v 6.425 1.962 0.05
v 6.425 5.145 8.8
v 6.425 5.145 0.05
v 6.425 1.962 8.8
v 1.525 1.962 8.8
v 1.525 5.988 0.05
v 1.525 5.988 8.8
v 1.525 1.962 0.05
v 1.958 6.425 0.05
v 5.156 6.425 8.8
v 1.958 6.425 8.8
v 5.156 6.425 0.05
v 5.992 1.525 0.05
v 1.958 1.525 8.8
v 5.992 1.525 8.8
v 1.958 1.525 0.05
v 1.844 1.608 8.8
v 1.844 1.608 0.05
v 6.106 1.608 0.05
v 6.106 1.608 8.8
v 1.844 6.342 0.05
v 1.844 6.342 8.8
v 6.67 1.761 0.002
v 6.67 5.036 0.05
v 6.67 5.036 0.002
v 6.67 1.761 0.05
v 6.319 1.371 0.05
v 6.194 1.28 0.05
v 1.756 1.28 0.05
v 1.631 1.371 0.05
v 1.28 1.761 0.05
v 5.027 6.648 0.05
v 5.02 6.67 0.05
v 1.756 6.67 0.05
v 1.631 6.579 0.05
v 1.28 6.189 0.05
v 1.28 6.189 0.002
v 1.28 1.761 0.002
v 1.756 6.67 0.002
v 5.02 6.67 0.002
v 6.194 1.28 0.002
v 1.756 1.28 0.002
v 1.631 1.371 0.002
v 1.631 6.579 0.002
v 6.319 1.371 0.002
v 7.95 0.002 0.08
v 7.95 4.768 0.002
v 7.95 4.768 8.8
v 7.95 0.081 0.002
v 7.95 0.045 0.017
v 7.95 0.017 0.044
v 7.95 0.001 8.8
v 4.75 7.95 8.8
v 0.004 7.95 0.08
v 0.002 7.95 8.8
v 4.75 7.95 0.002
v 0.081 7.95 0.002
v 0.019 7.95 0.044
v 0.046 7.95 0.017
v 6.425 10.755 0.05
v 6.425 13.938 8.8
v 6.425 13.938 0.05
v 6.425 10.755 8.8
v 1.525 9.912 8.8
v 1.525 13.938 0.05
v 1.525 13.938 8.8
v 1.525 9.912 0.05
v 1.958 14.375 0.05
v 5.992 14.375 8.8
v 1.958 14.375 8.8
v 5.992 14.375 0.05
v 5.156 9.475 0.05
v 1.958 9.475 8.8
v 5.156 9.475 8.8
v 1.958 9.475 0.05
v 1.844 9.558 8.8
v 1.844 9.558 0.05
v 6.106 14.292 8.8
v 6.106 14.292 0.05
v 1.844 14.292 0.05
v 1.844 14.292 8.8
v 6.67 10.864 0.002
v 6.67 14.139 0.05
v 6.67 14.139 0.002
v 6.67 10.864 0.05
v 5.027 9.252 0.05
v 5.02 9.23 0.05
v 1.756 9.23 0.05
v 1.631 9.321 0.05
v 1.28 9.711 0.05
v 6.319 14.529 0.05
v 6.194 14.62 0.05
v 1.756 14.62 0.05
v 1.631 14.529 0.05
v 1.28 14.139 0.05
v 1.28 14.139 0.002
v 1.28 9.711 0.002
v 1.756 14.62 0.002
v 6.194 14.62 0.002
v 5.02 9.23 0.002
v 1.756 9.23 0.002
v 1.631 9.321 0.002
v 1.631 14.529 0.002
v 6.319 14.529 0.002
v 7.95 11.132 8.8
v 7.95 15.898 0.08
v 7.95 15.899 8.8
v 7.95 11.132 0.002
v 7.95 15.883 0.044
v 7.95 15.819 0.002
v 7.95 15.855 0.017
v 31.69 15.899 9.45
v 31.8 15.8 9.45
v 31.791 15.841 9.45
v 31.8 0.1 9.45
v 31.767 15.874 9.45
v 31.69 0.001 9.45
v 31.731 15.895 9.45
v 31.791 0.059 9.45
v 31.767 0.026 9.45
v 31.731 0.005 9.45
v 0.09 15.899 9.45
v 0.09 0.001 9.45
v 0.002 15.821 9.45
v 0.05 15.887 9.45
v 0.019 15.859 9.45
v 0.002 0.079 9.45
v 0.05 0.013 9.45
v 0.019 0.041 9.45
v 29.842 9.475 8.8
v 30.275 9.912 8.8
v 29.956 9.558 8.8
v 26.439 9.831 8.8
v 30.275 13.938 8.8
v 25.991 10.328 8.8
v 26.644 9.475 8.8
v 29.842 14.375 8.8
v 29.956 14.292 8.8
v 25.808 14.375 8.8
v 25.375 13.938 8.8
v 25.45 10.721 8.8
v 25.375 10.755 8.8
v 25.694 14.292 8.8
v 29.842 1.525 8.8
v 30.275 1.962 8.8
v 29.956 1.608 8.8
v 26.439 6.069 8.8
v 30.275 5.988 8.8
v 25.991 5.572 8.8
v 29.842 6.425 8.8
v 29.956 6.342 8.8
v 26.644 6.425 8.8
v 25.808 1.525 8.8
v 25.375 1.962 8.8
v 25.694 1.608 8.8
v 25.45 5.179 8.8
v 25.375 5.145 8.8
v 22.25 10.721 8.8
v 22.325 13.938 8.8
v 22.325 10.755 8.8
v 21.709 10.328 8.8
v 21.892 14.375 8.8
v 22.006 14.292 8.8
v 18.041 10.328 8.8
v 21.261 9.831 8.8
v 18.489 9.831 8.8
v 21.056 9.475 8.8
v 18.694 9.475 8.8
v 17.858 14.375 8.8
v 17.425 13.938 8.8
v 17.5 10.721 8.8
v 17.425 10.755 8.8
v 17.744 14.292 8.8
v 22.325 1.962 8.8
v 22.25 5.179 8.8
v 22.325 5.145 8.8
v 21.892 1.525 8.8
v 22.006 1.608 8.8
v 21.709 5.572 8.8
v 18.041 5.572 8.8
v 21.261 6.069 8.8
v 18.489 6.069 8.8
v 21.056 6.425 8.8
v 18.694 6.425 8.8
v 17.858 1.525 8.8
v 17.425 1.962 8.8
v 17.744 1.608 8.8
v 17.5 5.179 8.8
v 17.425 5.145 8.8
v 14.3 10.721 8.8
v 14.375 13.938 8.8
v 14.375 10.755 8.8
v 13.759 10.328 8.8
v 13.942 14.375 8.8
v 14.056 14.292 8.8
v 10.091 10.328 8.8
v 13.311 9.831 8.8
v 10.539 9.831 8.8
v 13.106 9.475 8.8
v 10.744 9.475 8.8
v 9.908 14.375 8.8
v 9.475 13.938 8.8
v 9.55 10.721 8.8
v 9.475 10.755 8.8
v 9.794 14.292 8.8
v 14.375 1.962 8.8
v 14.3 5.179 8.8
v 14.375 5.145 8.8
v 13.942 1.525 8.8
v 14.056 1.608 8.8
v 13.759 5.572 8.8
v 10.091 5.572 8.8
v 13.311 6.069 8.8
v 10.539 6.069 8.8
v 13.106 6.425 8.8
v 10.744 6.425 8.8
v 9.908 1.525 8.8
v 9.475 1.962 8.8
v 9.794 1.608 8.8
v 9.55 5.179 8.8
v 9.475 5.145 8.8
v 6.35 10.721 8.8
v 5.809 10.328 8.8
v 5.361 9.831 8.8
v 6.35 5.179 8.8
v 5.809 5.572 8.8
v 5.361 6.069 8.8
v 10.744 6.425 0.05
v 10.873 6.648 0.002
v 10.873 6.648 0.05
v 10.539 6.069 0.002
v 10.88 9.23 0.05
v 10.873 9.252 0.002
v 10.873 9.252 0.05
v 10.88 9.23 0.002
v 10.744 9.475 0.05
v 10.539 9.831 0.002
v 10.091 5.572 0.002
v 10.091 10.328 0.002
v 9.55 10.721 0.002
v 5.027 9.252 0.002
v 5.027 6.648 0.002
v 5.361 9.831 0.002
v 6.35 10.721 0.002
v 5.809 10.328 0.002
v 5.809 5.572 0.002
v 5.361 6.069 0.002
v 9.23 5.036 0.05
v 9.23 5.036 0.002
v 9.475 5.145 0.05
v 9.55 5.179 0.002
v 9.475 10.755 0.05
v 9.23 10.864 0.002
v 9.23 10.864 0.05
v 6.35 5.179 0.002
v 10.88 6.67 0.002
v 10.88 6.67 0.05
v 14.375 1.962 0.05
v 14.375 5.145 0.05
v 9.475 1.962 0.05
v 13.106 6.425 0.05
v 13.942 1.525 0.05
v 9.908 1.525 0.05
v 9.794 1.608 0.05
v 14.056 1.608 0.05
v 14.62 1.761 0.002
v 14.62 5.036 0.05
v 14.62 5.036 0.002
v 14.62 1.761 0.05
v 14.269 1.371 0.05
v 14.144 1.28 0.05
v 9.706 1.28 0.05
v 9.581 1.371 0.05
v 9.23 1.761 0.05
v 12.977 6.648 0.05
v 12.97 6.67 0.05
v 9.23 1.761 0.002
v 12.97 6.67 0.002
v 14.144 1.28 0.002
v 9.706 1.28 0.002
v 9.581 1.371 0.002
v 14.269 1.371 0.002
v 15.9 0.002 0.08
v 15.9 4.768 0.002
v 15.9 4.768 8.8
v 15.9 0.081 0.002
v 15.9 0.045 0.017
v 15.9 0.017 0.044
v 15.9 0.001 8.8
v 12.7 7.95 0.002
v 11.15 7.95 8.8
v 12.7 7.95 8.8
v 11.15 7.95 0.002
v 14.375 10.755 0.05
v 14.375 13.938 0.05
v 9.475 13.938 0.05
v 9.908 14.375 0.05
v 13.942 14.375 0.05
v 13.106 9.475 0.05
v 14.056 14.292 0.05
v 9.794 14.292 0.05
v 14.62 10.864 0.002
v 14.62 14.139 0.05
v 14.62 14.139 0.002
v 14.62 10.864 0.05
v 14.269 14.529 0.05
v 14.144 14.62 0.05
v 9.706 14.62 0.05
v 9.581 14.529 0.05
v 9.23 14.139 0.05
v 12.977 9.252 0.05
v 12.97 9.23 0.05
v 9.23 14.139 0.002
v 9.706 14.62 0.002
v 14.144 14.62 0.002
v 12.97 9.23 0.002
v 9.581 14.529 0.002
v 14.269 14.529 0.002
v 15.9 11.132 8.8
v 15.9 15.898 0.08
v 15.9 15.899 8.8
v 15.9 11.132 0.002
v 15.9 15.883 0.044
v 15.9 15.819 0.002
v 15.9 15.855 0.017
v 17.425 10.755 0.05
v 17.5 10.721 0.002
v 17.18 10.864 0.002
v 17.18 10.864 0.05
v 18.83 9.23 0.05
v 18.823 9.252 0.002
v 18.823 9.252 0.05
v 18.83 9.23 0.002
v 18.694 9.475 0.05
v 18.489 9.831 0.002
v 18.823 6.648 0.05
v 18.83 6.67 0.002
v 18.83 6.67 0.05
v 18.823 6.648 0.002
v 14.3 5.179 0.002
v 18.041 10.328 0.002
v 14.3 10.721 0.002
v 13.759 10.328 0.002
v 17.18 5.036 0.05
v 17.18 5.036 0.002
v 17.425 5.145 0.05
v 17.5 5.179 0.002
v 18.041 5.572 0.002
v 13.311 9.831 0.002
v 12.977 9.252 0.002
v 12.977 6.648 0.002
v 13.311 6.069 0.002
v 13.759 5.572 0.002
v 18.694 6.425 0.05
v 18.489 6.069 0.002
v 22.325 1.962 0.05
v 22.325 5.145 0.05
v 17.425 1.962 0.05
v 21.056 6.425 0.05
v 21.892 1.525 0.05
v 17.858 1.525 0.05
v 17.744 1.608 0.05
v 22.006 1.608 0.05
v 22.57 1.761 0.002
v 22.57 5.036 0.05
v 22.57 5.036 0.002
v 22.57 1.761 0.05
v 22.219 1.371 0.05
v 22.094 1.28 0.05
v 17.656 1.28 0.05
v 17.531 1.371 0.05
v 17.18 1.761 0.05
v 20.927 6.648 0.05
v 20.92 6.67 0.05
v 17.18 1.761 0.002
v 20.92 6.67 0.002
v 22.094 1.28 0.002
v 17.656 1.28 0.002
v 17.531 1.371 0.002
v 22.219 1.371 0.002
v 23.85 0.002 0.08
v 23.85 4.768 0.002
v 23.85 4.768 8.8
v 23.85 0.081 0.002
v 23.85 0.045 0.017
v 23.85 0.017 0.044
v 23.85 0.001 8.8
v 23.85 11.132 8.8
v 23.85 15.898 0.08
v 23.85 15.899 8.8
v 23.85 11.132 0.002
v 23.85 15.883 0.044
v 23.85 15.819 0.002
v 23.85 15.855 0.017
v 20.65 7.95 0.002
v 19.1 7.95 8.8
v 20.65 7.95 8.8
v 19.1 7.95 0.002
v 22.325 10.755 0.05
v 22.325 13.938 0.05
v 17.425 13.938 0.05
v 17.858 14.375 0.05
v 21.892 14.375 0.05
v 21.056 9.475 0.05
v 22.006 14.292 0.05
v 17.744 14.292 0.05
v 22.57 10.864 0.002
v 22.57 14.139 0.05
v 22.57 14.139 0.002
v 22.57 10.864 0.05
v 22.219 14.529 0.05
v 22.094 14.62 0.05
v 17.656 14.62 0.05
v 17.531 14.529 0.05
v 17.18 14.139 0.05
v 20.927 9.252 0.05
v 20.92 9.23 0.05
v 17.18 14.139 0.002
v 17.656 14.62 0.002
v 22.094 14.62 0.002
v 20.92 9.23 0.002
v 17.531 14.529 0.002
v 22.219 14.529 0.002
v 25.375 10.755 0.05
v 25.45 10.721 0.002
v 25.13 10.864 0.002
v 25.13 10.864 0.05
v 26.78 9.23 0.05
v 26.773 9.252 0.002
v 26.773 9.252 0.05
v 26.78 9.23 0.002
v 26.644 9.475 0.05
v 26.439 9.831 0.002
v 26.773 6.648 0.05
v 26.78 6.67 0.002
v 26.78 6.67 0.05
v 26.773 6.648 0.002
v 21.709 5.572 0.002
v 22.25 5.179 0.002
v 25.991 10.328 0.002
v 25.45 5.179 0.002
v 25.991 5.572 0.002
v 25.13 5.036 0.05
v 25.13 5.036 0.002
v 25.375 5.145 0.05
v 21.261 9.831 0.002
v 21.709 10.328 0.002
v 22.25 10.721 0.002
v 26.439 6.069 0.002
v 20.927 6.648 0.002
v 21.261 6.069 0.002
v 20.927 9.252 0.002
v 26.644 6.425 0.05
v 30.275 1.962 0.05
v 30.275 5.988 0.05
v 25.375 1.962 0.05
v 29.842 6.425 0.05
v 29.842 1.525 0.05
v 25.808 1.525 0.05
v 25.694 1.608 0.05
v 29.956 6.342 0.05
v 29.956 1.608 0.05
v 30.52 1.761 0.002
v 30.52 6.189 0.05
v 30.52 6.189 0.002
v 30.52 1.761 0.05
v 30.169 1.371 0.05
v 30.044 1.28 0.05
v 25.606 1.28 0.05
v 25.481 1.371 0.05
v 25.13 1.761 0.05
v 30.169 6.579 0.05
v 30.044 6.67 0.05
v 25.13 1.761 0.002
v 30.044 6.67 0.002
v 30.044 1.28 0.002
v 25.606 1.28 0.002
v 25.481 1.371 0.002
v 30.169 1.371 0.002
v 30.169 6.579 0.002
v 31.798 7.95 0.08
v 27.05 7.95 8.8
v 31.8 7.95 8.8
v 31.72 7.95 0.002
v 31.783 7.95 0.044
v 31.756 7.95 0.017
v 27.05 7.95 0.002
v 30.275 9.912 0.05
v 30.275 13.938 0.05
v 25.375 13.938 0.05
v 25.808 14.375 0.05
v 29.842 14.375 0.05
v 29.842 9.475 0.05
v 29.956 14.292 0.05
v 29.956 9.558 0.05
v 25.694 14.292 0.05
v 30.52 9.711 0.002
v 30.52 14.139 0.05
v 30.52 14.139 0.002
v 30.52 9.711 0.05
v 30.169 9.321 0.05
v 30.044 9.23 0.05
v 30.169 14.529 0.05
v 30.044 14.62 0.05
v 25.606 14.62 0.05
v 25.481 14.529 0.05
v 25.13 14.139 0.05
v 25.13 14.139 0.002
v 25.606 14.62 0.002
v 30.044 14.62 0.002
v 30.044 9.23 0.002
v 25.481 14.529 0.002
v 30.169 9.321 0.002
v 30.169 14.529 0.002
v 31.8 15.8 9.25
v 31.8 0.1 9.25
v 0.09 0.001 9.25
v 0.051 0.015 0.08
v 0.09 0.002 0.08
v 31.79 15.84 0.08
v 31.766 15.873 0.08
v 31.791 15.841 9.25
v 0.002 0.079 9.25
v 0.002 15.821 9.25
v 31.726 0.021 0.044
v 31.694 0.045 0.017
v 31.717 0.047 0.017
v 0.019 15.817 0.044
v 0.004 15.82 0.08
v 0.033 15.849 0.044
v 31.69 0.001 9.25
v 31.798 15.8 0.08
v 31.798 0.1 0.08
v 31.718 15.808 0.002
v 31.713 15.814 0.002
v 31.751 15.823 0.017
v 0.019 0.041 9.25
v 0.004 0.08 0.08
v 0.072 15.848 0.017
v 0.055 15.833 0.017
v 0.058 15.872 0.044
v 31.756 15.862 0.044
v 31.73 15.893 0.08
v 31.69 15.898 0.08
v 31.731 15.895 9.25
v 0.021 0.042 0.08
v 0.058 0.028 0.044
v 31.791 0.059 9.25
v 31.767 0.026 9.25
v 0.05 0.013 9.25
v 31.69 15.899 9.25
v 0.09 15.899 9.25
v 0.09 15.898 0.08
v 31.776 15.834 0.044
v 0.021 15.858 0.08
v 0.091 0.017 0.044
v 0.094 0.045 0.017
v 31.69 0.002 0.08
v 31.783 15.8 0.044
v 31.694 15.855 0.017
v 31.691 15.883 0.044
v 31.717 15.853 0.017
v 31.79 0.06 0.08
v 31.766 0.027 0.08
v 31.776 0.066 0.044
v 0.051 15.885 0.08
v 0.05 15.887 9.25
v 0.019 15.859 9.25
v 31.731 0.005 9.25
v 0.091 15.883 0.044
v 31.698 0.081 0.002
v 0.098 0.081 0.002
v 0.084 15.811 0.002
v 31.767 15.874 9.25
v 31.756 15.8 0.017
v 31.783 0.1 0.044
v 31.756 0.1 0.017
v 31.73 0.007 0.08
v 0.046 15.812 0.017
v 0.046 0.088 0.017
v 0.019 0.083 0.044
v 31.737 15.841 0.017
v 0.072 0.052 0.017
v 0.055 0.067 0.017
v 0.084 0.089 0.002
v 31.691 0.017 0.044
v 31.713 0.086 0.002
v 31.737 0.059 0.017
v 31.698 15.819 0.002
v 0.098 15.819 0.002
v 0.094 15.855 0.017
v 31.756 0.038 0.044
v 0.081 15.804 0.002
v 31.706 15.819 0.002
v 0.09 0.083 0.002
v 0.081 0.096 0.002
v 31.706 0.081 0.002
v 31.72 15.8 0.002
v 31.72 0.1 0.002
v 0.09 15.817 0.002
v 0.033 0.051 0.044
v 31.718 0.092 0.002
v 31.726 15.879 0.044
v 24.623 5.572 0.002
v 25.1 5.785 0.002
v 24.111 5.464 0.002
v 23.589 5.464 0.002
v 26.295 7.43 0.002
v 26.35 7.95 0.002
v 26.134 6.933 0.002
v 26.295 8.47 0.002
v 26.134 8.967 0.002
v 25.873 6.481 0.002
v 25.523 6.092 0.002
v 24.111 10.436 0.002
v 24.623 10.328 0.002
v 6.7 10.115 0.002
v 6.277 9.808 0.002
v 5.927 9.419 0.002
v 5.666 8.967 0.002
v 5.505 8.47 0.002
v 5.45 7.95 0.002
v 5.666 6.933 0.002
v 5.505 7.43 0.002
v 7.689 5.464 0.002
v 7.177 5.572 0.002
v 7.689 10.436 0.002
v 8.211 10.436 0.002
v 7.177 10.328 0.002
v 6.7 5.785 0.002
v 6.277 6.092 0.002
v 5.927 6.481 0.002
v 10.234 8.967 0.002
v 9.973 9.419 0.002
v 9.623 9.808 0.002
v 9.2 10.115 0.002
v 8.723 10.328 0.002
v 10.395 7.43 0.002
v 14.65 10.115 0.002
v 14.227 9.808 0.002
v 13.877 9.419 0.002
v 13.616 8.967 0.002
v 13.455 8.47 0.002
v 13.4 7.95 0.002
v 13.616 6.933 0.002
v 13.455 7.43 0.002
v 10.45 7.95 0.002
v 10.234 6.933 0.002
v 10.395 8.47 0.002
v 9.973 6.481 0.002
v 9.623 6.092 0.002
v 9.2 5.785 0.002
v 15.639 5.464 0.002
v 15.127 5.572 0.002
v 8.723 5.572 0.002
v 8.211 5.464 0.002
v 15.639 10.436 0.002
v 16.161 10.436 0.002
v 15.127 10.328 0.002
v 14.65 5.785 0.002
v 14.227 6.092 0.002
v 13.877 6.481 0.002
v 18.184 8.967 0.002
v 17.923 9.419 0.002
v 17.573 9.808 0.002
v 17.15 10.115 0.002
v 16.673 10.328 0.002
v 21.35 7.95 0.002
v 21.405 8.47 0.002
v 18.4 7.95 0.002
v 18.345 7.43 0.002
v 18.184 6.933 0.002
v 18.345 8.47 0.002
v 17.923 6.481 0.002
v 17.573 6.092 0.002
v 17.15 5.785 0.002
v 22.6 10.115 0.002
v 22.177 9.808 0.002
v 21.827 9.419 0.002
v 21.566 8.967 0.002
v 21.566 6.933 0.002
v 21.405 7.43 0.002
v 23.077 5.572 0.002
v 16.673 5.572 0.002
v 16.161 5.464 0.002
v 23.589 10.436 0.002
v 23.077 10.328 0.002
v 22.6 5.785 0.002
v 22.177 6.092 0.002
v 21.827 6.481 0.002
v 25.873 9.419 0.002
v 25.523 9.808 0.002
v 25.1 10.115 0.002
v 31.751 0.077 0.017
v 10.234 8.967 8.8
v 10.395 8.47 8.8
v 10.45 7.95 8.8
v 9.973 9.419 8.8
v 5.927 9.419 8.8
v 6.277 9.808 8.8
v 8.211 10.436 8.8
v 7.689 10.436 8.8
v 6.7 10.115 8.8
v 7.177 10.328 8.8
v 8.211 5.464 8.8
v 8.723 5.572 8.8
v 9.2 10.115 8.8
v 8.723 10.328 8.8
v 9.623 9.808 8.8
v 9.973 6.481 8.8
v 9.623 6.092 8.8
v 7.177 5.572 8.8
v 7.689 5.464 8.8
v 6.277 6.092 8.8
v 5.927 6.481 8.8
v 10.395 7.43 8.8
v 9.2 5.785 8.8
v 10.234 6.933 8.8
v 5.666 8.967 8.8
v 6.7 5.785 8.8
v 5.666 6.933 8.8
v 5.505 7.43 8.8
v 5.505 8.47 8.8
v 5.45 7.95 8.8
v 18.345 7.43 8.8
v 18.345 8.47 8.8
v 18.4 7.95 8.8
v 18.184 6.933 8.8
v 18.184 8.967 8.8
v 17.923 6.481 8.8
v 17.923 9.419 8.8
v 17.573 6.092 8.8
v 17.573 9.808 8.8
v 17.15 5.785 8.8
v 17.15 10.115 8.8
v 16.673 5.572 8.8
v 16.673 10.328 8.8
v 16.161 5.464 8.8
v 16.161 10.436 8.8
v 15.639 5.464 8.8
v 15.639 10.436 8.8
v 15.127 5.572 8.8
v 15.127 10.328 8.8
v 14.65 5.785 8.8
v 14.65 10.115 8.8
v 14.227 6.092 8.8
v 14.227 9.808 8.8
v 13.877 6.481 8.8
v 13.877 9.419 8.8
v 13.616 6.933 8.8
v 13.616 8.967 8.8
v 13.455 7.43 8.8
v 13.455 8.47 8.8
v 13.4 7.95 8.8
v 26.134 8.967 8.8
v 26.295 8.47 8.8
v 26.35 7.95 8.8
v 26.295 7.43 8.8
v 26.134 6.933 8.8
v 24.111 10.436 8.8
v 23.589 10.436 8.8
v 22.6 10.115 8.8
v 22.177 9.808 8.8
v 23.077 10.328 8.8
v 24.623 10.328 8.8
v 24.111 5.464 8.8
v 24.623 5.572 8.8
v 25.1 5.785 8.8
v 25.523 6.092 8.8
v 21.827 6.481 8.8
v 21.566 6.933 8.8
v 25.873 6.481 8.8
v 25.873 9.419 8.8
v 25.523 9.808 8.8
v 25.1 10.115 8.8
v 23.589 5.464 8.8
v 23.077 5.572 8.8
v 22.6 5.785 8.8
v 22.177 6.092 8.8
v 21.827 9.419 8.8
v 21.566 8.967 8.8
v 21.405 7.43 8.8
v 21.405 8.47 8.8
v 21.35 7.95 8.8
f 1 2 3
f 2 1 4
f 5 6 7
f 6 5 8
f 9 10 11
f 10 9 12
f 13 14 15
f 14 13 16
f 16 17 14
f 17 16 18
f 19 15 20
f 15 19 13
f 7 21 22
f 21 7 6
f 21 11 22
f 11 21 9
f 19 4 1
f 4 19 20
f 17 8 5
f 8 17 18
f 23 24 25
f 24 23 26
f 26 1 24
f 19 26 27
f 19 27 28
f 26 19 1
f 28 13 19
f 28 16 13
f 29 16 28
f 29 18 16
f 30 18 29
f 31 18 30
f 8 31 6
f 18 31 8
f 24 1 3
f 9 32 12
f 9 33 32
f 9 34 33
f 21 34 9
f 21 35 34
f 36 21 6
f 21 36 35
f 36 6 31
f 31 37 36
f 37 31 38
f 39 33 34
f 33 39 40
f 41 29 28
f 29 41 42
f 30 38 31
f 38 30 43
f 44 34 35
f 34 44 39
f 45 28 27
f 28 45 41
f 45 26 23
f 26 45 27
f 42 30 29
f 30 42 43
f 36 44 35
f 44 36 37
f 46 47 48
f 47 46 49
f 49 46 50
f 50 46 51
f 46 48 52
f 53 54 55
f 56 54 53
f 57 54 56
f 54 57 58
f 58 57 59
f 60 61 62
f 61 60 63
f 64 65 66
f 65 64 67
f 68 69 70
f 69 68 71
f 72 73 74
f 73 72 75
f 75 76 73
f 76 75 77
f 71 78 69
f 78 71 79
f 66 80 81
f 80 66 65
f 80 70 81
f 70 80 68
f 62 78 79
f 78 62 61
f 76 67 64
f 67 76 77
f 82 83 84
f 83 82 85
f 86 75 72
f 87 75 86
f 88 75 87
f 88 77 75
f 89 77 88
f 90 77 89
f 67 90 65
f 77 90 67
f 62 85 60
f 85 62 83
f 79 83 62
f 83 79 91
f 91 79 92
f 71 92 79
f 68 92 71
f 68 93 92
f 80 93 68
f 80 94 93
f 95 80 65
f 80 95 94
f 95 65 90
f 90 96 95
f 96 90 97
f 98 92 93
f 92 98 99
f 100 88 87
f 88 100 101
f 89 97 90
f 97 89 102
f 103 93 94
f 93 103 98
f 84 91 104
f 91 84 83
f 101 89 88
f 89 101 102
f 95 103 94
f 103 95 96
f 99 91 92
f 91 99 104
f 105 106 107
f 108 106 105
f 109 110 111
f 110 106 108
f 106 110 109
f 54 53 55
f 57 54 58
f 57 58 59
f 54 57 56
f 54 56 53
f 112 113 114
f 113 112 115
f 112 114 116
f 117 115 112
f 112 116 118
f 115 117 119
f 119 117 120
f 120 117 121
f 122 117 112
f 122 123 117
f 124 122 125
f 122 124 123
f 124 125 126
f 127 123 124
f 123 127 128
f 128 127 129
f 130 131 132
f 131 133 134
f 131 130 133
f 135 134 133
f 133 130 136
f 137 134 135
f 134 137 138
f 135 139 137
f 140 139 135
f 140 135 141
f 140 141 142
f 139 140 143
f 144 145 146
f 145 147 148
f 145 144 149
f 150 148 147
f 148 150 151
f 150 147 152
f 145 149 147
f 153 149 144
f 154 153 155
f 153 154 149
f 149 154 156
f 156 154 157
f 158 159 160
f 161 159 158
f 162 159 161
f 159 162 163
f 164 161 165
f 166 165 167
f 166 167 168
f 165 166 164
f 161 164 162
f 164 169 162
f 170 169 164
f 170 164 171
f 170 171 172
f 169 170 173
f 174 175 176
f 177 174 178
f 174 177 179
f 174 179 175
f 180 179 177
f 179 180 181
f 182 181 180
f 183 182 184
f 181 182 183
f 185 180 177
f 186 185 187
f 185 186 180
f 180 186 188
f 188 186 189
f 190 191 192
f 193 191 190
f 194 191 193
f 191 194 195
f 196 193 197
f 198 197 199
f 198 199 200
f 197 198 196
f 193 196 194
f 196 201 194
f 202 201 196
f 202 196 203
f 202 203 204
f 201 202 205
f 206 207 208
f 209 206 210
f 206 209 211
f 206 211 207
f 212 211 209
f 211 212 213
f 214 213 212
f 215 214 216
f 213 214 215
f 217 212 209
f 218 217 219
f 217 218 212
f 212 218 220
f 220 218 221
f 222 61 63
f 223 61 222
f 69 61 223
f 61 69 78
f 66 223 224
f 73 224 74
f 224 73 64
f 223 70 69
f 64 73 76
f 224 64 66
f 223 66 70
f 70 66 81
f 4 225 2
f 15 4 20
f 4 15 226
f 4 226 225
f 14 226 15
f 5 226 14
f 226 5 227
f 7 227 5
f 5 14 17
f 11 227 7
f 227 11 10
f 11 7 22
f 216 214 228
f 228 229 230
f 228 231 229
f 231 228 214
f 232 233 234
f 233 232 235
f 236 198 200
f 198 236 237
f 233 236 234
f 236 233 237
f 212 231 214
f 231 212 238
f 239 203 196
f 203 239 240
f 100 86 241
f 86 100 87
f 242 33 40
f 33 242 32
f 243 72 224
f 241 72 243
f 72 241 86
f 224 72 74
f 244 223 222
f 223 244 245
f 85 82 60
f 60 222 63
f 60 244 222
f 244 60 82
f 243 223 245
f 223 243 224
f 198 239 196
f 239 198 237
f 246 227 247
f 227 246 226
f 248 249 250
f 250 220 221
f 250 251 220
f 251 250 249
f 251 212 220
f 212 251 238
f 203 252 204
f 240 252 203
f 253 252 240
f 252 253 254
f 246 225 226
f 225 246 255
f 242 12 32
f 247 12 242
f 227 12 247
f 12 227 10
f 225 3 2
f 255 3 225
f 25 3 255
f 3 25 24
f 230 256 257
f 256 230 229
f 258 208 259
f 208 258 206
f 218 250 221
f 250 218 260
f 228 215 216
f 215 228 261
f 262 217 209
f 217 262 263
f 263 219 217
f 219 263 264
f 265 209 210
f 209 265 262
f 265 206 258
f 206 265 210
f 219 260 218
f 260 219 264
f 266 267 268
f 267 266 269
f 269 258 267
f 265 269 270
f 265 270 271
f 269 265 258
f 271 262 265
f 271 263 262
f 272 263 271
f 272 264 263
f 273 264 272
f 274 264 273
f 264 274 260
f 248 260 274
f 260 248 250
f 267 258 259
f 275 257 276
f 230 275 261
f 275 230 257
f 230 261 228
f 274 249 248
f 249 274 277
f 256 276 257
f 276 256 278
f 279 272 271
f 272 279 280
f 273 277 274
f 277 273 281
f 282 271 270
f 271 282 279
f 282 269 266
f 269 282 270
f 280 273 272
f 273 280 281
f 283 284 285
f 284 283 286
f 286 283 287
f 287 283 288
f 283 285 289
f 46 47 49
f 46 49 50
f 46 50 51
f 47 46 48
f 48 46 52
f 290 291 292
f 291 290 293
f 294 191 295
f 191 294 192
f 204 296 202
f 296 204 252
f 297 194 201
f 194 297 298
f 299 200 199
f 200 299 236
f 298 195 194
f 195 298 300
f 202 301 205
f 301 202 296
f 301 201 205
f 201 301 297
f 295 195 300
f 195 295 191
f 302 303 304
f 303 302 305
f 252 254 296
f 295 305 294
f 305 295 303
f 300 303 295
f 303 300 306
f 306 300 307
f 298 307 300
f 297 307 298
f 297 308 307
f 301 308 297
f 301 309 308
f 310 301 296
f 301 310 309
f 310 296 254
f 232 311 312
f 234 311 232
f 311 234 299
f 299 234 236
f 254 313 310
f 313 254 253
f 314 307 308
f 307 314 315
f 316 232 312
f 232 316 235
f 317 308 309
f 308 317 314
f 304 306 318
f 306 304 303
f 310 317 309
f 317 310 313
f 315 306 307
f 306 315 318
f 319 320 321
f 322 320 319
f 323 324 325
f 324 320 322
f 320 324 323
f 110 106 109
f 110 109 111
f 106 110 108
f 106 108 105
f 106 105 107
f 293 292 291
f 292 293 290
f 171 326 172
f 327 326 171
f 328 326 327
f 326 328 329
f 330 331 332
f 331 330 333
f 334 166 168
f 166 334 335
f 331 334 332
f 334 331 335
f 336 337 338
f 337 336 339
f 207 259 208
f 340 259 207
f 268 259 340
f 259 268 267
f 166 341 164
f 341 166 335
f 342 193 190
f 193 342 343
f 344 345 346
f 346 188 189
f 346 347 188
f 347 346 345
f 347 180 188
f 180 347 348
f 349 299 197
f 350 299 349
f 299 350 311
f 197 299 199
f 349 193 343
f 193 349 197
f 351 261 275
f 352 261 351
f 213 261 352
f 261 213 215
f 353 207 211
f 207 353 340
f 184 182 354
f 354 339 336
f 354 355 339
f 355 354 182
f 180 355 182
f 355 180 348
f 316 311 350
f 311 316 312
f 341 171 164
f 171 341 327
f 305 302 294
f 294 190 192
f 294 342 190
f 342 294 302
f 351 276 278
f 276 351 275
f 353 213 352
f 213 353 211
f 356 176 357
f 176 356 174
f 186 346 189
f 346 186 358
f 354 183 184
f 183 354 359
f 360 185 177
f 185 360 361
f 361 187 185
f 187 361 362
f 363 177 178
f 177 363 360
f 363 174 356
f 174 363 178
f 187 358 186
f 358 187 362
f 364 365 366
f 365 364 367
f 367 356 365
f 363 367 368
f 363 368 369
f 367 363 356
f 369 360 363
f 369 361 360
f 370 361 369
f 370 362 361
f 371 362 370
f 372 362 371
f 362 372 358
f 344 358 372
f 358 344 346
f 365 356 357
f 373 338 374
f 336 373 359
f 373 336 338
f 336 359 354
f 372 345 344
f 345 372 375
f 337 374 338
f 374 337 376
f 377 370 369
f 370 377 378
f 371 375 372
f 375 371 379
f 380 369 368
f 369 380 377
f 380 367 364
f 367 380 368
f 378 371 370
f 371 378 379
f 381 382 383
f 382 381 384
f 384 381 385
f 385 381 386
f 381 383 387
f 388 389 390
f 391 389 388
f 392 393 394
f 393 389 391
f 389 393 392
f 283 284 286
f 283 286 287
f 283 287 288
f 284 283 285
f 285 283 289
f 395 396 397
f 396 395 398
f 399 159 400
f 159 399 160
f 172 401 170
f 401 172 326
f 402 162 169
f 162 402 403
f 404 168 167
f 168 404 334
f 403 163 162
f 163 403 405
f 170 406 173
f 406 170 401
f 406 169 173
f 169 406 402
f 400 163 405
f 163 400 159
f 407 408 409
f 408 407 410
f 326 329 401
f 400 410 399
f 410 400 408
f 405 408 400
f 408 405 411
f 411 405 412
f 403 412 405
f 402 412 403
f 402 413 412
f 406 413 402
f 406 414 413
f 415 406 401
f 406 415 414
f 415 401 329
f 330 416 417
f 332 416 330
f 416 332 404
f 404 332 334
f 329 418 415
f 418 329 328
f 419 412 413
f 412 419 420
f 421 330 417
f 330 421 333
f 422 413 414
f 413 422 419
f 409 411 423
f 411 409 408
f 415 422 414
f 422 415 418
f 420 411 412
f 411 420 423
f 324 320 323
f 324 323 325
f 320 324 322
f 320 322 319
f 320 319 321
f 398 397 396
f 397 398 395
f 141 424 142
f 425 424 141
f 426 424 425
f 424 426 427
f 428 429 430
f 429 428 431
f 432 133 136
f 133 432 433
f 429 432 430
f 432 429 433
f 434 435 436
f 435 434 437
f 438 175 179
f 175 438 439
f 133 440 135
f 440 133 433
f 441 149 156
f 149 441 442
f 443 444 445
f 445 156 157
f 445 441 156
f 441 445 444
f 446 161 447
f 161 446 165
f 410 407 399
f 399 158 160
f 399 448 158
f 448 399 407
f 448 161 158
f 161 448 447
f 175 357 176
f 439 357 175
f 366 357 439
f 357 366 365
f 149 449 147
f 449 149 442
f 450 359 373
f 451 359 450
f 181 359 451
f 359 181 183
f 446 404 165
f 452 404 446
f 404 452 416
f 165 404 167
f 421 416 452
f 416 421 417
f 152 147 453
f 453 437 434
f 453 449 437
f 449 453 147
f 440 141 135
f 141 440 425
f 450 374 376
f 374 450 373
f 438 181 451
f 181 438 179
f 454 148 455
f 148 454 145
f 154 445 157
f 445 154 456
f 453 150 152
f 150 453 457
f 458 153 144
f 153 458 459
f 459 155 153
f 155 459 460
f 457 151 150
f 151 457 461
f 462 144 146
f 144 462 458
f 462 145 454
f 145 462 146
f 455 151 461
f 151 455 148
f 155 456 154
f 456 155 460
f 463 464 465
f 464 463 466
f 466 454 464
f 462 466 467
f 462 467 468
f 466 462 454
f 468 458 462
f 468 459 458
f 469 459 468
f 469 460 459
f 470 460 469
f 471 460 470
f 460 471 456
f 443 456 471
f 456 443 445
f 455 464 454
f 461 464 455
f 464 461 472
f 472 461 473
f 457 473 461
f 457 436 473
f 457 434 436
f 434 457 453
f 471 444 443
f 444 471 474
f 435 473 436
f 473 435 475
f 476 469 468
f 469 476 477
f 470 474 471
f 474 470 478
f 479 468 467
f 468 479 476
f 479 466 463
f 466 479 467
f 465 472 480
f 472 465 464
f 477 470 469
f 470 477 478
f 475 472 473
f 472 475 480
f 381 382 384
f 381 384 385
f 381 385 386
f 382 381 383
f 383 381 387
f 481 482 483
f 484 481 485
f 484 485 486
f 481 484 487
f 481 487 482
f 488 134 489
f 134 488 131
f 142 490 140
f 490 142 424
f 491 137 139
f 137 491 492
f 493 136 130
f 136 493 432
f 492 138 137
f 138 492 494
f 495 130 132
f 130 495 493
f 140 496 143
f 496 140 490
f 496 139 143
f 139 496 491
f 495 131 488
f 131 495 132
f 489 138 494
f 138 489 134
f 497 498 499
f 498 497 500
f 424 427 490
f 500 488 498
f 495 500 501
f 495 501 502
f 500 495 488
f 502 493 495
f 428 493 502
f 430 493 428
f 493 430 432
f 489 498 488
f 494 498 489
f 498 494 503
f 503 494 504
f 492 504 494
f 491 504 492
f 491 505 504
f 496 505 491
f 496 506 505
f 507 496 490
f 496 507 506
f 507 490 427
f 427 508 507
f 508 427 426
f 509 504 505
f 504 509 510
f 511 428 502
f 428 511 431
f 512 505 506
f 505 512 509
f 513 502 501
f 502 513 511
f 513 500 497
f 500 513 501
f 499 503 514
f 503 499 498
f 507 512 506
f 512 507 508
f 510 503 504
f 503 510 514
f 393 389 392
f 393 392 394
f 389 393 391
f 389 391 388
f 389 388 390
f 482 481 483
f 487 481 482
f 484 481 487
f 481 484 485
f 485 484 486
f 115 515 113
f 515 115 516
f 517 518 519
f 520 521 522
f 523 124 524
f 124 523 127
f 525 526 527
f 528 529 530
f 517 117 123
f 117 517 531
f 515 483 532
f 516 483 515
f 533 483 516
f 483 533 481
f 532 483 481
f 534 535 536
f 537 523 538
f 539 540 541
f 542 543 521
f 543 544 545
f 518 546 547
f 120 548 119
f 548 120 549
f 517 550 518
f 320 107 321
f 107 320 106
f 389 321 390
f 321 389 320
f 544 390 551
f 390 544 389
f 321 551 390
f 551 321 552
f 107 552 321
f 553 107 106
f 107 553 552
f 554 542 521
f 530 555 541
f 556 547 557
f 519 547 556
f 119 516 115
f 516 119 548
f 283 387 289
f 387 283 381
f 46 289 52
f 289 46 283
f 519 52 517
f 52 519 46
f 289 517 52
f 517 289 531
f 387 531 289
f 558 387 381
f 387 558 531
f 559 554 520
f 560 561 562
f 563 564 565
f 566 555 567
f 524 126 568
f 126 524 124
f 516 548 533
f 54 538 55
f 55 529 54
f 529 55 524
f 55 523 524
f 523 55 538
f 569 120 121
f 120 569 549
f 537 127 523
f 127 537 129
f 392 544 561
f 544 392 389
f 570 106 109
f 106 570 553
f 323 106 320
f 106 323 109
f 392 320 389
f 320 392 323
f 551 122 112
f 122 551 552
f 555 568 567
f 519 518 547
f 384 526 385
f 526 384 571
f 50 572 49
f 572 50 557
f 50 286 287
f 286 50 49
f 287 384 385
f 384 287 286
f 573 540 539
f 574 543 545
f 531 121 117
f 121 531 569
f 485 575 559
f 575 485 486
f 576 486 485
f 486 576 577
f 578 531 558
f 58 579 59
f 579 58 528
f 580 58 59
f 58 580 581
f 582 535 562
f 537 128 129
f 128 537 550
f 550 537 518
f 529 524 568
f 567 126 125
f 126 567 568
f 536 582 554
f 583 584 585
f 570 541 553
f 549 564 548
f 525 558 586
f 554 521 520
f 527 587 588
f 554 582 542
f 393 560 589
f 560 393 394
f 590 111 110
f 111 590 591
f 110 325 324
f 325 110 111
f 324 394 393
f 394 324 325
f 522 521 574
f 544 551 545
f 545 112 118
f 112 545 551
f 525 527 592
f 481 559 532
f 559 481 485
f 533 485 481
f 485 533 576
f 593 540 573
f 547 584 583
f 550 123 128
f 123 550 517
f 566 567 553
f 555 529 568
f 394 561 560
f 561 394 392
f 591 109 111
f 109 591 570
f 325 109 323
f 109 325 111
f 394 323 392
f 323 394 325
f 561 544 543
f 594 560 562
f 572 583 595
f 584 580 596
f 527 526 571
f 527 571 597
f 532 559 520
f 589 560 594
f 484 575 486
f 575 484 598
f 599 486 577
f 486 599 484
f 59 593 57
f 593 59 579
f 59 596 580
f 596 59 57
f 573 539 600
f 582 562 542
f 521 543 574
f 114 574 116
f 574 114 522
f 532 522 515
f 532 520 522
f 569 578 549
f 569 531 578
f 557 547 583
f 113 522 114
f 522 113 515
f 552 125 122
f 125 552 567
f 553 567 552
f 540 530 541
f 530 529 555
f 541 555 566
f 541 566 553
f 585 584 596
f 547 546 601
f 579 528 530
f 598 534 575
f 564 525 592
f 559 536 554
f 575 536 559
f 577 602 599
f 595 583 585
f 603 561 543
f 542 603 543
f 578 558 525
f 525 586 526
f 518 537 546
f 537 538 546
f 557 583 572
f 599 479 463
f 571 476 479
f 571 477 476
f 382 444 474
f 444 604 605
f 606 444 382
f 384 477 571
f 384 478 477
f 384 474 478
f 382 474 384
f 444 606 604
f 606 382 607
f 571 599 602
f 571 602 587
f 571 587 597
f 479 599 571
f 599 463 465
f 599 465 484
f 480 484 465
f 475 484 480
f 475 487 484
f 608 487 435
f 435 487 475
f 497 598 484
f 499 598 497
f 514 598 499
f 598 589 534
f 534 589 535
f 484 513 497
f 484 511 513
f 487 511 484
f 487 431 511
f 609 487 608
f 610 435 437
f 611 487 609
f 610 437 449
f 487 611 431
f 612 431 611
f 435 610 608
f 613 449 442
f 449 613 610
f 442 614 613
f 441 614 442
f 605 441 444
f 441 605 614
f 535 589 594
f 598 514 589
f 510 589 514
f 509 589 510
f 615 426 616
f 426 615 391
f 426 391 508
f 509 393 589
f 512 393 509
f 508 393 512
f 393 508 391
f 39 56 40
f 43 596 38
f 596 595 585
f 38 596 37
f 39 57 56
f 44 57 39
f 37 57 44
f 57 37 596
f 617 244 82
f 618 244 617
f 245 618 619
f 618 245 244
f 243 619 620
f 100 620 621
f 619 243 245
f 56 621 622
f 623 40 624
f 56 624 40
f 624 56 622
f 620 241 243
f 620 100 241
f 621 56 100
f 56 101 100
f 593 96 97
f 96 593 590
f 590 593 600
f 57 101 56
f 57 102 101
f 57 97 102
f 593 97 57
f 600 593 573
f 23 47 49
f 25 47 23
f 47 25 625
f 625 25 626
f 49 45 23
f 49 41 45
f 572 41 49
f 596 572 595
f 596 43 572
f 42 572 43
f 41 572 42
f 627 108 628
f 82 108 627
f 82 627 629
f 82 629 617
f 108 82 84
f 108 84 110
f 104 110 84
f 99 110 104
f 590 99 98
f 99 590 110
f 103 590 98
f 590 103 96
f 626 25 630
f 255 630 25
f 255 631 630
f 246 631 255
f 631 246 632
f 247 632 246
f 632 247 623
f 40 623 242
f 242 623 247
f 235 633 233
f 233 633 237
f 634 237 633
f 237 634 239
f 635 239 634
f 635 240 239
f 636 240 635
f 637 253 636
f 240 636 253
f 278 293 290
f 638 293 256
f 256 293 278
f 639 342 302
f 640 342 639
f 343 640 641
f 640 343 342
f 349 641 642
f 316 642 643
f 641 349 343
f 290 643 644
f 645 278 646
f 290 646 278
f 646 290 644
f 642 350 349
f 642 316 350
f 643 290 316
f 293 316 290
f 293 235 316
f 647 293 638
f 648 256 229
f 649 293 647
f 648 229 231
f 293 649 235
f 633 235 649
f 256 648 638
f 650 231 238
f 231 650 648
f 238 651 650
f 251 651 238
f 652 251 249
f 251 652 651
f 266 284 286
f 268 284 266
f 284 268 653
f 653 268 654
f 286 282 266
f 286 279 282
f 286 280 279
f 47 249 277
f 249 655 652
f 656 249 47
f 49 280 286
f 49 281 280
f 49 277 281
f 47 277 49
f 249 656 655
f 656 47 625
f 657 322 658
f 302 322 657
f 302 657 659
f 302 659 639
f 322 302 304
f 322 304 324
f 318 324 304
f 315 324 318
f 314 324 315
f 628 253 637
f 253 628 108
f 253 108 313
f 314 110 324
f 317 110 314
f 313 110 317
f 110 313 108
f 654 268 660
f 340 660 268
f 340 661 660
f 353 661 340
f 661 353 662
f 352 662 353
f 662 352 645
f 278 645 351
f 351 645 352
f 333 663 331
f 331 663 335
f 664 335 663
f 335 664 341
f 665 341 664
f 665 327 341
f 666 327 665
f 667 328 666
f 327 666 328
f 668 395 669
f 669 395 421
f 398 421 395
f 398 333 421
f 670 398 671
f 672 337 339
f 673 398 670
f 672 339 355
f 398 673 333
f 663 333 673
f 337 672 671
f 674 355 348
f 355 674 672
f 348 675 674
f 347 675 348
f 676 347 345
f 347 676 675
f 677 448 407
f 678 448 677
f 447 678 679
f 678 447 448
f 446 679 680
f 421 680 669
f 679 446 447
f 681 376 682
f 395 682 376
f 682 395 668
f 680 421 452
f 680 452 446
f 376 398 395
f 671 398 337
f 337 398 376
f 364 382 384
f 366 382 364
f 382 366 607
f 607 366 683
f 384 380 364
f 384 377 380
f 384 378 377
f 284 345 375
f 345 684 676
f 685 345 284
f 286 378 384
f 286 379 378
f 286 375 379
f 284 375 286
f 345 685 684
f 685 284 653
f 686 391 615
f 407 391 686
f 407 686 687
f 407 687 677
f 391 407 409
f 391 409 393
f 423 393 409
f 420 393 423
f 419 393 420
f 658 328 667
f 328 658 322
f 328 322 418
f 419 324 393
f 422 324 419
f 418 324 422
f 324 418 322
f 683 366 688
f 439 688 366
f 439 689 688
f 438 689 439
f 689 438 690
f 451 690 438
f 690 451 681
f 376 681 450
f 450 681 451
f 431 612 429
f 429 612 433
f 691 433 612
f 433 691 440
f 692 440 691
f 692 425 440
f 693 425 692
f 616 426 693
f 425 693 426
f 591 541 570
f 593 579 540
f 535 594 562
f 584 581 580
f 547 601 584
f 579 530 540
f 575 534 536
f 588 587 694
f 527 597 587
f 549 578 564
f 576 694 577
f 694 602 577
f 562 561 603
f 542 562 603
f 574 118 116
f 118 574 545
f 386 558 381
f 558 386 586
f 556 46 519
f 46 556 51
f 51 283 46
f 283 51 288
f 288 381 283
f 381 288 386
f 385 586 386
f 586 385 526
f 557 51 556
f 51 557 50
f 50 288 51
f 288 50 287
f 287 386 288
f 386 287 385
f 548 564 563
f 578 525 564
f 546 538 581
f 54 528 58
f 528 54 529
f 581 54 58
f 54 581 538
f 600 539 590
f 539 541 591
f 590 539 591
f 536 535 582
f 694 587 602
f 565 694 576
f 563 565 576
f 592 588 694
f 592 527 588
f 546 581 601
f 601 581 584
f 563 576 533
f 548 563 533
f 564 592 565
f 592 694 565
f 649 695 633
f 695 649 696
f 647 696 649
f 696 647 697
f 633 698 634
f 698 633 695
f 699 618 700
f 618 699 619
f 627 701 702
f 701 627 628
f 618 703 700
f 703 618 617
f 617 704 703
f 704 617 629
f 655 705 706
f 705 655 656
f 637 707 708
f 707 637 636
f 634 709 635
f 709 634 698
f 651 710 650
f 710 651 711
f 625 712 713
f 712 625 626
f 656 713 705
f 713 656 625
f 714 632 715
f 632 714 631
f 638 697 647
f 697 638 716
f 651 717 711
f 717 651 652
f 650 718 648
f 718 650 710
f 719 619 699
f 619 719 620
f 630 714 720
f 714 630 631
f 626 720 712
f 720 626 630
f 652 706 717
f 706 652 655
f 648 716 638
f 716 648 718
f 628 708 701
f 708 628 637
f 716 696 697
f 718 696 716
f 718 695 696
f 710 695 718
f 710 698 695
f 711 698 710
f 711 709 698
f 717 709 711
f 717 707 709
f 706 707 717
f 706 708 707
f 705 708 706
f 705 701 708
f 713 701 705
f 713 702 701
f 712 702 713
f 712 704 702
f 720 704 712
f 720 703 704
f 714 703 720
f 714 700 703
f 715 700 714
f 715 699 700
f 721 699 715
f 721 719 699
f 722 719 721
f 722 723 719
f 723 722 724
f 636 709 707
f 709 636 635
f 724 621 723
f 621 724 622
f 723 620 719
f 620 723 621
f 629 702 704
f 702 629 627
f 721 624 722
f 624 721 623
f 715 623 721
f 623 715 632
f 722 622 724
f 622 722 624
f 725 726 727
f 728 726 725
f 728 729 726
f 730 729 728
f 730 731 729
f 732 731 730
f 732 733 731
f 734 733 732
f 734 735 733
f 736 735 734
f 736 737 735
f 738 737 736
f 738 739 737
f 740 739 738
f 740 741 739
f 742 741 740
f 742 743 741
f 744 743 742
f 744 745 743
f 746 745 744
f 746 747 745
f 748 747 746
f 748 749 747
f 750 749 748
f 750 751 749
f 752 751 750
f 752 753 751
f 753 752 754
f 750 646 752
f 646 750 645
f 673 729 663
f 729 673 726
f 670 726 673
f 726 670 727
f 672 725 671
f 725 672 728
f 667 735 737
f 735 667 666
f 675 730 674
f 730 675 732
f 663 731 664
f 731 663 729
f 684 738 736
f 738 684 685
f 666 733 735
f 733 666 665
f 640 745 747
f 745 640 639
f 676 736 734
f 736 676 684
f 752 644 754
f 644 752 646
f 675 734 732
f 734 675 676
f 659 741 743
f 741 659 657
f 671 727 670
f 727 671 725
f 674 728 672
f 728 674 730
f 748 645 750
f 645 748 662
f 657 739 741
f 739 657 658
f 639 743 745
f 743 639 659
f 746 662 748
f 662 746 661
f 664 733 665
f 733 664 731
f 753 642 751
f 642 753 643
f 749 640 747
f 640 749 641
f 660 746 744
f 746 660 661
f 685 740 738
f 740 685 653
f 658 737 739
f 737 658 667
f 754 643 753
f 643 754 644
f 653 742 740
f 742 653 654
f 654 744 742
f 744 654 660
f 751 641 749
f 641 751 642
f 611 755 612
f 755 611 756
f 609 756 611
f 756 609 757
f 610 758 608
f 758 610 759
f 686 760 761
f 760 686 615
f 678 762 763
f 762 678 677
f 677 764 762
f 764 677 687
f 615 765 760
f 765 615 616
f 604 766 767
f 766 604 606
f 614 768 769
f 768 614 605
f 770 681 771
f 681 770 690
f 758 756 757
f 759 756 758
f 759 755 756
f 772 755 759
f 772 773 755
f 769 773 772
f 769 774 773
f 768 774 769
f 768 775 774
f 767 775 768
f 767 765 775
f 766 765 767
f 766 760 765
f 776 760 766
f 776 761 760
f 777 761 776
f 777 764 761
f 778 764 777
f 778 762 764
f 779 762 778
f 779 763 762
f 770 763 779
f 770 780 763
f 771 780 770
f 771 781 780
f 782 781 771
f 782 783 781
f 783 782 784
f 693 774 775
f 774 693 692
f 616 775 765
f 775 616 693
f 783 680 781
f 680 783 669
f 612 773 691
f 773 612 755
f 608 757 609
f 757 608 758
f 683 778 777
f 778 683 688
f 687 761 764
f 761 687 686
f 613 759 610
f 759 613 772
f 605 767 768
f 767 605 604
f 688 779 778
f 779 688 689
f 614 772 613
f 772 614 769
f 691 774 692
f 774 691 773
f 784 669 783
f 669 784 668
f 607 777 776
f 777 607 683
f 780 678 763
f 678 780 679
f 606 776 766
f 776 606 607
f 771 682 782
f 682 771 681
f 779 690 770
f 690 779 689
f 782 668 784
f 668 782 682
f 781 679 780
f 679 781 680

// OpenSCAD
// file: ../lib/roundedcube_simple.scad
module roundedcube_simple(size = [1, 1, 1], center = false, radius = 0.5, resolution = 20) {
	// If single value, convert to [x, y, z] vector
	size = (size[0] == undef) ? [size, size, size] : size;

	translate = (center == false) ?
		[radius, radius, radius] :
		[
			radius - (size[0] / 2),
			radius - (size[1] / 2),
			radius - (size[2] / 2)
	];

	translate(v = translate)
	minkowski() {
		cube(size = [
			size[0] - (radius * 2),
			size[1] - (radius * 2),
			size[2] - (radius * 2)
		]);
		sphere(r = radius, $fn = resolution);
	}
}
// file: ../lib/roundedcube.scad
// More information: https://danielupshaw.com/openscad-rounded-corners/

// Set to 0.01 for higher definition curves (renders slower)
$fs = 0.15;

module roundedcube(size = [1, 1, 1], center = false, radius = 0.5, apply_to = "all", resolution = 20) {
	// If single value, convert to [x, y, z] vector
	size = (size[0] == undef) ? [size, size, size] : size;

	translate_min = radius;
	translate_xmax = size[0] - radius;
	translate_ymax = size[1] - radius;
	translate_zmax = size[2] - radius;

	diameter = radius * 2;

	obj_translate = (center == false) ?
		[0, 0, 0] : [
			-(size[0] / 2),
			-(size[1] / 2),
			-(size[2] / 2)
		];

	translate(v = obj_translate) {
		hull() {
			for (translate_x = [translate_min, translate_xmax]) {
				x_at = (translate_x == translate_min) ? "min" : "max";
				for (translate_y = [translate_min, translate_ymax]) {
					y_at = (translate_y == translate_min) ? "min" : "max";
					for (translate_z = [translate_min, translate_zmax]) {
						z_at = (translate_z == translate_min) ? "min" : "max";

						translate(v = [translate_x, translate_y, translate_z])
						if (
							(apply_to == "all") ||
							(apply_to == "xmin" && x_at == "min") || (apply_to == "xmax" && x_at == "max") ||
							(apply_to == "ymin" && y_at == "min") || (apply_to == "ymax" && y_at == "max") ||
							(apply_to == "zmin" && z_at == "min") || (apply_to == "zmax" && z_at == "max")
						) {
							sphere(r = radius, $fn = resolution);
						} else {
							rotate = 
								(apply_to == "xmin" || apply_to == "xmax" || apply_to == "x") ? [0, 90, 0] : (
								(apply_to == "ymin" || apply_to == "ymax" || apply_to == "y") ? [90, 90, 0] :
								[0, 0, 0]
							);
							rotate(a = rotate)
							cylinder(h = diameter, r = radius, center = true, $fn = resolution);
						}
					}
				}
			}
		}
	}
}
// main file
echo(version=version());

include <../lib/block.scad>;

//4x2 Brick
translate([0,0,0])
    block(baseLayers=3, withKnobs=false);
